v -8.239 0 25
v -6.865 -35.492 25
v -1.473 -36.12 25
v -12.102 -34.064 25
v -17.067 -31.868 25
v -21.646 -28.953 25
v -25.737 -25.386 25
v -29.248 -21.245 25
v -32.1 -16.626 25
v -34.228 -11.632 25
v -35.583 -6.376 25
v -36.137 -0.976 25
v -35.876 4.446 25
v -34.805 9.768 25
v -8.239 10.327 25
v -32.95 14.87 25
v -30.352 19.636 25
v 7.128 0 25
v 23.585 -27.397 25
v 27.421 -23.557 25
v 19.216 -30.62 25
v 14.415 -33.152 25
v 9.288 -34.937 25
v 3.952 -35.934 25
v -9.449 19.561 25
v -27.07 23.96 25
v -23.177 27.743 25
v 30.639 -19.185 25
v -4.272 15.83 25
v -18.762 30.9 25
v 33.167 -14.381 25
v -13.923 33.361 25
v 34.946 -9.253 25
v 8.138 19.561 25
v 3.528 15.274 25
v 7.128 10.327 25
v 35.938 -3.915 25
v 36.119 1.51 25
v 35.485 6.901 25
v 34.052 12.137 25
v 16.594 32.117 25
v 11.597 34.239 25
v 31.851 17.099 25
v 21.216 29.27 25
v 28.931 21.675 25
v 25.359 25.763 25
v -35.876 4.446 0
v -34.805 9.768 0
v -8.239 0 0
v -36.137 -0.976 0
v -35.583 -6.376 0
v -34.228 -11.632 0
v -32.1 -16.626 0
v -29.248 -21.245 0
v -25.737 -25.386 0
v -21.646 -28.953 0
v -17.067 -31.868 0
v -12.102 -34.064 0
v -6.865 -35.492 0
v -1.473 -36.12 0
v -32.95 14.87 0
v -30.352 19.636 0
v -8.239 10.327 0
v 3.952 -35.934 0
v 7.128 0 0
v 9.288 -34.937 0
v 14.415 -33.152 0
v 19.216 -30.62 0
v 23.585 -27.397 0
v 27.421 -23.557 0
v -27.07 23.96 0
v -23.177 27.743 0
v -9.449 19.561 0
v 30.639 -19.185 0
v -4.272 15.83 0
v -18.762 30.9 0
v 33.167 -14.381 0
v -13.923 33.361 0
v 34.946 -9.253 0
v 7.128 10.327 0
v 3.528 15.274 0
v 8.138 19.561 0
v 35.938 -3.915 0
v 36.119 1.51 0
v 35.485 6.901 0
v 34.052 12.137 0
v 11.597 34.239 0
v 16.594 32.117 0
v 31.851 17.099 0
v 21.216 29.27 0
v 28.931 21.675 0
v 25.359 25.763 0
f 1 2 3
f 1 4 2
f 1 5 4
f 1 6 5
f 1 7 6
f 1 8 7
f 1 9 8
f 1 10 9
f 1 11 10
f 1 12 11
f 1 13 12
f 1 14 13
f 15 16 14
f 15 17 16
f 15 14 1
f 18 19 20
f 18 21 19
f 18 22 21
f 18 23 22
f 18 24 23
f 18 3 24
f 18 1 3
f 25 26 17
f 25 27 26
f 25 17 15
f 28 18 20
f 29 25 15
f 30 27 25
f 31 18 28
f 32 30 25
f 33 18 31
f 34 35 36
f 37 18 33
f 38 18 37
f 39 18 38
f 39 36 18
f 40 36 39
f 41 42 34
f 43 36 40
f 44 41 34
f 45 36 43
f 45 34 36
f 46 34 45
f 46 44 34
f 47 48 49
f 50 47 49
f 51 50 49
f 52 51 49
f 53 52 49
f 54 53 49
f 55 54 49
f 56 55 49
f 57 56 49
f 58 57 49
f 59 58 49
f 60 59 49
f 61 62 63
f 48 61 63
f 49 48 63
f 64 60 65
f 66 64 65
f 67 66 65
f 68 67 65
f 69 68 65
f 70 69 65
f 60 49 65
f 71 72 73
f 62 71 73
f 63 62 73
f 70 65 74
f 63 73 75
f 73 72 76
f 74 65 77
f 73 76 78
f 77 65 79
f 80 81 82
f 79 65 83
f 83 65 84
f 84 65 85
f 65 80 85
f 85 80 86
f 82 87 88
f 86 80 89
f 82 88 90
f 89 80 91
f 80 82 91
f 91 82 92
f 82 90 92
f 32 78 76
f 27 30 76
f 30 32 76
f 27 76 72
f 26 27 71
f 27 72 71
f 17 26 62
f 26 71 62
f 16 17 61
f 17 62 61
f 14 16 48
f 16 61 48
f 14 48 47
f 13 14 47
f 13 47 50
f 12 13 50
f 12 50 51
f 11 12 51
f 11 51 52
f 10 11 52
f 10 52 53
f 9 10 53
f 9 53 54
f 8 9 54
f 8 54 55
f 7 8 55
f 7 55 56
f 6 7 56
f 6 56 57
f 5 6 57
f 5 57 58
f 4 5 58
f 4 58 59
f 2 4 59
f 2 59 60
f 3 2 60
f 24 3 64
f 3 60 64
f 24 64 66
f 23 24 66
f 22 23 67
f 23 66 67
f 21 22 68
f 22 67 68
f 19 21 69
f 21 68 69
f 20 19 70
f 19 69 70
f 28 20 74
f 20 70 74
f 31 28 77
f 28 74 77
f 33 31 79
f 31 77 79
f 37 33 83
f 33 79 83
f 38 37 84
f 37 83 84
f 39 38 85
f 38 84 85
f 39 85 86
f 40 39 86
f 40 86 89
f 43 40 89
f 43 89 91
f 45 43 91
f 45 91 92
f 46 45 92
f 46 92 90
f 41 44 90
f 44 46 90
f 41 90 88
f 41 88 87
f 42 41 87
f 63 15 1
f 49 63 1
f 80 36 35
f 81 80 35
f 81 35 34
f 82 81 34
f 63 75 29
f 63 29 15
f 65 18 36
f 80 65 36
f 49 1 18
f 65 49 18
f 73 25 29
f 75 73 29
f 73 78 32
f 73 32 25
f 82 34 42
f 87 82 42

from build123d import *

# Parameters (mm, degrees)
F0_R     = 36.1502076958
F1_DEPTH = 25
F3_DEPTH = 25


with BuildPart() as f1:
    # F0 (on Top) → F1 (new body)
    with BuildSketch(Plane.XY):
        Circle(F0_R)
    extrude(amount=F1_DEPTH)

    # F2 (on face) → F3 (cut)
    with BuildSketch(Plane.XY.offset(25)):
        with BuildLine():
            Line((-8.2388771698, 0), (0, 0))
            Line((0, 0), (0, 36.1502076958))
            ThreePointArc((0, 36.1502076958), (-7.0998109764, 35.4461591791), (-13.9230751939, 33.3614372232))
            Line((-13.9230751939, 33.3614372232), (-9.4486636828, 19.5610804365))
            Line((-9.4486636828, 19.5610804365), (-4.2720828205, 15.8297549933))
            Line((-4.2720828205, 15.8297549933), (-8.2388771698, 10.326500982))
            Line((-8.2388771698, 10.326500982), (-8.2388771698, 0))
        make_face()
        with BuildLine():
            Line((0, 36.1502076958), (0, 0))
            Line((0, 0), (7.1280188859, 0))
            Line((7.1280188859, 0), (7.1280188859, 10.326500982))
            Line((7.1280188859, 10.326500982), (3.5276915878, 15.274326317))
            Line((3.5276915878, 15.274326317), (8.1382541345, 19.5610804365))
            Line((8.1382541345, 19.5610804365), (11.5974145733, 34.2394143008))
            ThreePointArc((11.5974145733, 34.2394143008), (5.8768859991, 35.6693107223), (0, 36.1502076958))
        make_face()
    extrude(amount=-F3_DEPTH, mode=Mode.SUBTRACT)


solid = f1.part
